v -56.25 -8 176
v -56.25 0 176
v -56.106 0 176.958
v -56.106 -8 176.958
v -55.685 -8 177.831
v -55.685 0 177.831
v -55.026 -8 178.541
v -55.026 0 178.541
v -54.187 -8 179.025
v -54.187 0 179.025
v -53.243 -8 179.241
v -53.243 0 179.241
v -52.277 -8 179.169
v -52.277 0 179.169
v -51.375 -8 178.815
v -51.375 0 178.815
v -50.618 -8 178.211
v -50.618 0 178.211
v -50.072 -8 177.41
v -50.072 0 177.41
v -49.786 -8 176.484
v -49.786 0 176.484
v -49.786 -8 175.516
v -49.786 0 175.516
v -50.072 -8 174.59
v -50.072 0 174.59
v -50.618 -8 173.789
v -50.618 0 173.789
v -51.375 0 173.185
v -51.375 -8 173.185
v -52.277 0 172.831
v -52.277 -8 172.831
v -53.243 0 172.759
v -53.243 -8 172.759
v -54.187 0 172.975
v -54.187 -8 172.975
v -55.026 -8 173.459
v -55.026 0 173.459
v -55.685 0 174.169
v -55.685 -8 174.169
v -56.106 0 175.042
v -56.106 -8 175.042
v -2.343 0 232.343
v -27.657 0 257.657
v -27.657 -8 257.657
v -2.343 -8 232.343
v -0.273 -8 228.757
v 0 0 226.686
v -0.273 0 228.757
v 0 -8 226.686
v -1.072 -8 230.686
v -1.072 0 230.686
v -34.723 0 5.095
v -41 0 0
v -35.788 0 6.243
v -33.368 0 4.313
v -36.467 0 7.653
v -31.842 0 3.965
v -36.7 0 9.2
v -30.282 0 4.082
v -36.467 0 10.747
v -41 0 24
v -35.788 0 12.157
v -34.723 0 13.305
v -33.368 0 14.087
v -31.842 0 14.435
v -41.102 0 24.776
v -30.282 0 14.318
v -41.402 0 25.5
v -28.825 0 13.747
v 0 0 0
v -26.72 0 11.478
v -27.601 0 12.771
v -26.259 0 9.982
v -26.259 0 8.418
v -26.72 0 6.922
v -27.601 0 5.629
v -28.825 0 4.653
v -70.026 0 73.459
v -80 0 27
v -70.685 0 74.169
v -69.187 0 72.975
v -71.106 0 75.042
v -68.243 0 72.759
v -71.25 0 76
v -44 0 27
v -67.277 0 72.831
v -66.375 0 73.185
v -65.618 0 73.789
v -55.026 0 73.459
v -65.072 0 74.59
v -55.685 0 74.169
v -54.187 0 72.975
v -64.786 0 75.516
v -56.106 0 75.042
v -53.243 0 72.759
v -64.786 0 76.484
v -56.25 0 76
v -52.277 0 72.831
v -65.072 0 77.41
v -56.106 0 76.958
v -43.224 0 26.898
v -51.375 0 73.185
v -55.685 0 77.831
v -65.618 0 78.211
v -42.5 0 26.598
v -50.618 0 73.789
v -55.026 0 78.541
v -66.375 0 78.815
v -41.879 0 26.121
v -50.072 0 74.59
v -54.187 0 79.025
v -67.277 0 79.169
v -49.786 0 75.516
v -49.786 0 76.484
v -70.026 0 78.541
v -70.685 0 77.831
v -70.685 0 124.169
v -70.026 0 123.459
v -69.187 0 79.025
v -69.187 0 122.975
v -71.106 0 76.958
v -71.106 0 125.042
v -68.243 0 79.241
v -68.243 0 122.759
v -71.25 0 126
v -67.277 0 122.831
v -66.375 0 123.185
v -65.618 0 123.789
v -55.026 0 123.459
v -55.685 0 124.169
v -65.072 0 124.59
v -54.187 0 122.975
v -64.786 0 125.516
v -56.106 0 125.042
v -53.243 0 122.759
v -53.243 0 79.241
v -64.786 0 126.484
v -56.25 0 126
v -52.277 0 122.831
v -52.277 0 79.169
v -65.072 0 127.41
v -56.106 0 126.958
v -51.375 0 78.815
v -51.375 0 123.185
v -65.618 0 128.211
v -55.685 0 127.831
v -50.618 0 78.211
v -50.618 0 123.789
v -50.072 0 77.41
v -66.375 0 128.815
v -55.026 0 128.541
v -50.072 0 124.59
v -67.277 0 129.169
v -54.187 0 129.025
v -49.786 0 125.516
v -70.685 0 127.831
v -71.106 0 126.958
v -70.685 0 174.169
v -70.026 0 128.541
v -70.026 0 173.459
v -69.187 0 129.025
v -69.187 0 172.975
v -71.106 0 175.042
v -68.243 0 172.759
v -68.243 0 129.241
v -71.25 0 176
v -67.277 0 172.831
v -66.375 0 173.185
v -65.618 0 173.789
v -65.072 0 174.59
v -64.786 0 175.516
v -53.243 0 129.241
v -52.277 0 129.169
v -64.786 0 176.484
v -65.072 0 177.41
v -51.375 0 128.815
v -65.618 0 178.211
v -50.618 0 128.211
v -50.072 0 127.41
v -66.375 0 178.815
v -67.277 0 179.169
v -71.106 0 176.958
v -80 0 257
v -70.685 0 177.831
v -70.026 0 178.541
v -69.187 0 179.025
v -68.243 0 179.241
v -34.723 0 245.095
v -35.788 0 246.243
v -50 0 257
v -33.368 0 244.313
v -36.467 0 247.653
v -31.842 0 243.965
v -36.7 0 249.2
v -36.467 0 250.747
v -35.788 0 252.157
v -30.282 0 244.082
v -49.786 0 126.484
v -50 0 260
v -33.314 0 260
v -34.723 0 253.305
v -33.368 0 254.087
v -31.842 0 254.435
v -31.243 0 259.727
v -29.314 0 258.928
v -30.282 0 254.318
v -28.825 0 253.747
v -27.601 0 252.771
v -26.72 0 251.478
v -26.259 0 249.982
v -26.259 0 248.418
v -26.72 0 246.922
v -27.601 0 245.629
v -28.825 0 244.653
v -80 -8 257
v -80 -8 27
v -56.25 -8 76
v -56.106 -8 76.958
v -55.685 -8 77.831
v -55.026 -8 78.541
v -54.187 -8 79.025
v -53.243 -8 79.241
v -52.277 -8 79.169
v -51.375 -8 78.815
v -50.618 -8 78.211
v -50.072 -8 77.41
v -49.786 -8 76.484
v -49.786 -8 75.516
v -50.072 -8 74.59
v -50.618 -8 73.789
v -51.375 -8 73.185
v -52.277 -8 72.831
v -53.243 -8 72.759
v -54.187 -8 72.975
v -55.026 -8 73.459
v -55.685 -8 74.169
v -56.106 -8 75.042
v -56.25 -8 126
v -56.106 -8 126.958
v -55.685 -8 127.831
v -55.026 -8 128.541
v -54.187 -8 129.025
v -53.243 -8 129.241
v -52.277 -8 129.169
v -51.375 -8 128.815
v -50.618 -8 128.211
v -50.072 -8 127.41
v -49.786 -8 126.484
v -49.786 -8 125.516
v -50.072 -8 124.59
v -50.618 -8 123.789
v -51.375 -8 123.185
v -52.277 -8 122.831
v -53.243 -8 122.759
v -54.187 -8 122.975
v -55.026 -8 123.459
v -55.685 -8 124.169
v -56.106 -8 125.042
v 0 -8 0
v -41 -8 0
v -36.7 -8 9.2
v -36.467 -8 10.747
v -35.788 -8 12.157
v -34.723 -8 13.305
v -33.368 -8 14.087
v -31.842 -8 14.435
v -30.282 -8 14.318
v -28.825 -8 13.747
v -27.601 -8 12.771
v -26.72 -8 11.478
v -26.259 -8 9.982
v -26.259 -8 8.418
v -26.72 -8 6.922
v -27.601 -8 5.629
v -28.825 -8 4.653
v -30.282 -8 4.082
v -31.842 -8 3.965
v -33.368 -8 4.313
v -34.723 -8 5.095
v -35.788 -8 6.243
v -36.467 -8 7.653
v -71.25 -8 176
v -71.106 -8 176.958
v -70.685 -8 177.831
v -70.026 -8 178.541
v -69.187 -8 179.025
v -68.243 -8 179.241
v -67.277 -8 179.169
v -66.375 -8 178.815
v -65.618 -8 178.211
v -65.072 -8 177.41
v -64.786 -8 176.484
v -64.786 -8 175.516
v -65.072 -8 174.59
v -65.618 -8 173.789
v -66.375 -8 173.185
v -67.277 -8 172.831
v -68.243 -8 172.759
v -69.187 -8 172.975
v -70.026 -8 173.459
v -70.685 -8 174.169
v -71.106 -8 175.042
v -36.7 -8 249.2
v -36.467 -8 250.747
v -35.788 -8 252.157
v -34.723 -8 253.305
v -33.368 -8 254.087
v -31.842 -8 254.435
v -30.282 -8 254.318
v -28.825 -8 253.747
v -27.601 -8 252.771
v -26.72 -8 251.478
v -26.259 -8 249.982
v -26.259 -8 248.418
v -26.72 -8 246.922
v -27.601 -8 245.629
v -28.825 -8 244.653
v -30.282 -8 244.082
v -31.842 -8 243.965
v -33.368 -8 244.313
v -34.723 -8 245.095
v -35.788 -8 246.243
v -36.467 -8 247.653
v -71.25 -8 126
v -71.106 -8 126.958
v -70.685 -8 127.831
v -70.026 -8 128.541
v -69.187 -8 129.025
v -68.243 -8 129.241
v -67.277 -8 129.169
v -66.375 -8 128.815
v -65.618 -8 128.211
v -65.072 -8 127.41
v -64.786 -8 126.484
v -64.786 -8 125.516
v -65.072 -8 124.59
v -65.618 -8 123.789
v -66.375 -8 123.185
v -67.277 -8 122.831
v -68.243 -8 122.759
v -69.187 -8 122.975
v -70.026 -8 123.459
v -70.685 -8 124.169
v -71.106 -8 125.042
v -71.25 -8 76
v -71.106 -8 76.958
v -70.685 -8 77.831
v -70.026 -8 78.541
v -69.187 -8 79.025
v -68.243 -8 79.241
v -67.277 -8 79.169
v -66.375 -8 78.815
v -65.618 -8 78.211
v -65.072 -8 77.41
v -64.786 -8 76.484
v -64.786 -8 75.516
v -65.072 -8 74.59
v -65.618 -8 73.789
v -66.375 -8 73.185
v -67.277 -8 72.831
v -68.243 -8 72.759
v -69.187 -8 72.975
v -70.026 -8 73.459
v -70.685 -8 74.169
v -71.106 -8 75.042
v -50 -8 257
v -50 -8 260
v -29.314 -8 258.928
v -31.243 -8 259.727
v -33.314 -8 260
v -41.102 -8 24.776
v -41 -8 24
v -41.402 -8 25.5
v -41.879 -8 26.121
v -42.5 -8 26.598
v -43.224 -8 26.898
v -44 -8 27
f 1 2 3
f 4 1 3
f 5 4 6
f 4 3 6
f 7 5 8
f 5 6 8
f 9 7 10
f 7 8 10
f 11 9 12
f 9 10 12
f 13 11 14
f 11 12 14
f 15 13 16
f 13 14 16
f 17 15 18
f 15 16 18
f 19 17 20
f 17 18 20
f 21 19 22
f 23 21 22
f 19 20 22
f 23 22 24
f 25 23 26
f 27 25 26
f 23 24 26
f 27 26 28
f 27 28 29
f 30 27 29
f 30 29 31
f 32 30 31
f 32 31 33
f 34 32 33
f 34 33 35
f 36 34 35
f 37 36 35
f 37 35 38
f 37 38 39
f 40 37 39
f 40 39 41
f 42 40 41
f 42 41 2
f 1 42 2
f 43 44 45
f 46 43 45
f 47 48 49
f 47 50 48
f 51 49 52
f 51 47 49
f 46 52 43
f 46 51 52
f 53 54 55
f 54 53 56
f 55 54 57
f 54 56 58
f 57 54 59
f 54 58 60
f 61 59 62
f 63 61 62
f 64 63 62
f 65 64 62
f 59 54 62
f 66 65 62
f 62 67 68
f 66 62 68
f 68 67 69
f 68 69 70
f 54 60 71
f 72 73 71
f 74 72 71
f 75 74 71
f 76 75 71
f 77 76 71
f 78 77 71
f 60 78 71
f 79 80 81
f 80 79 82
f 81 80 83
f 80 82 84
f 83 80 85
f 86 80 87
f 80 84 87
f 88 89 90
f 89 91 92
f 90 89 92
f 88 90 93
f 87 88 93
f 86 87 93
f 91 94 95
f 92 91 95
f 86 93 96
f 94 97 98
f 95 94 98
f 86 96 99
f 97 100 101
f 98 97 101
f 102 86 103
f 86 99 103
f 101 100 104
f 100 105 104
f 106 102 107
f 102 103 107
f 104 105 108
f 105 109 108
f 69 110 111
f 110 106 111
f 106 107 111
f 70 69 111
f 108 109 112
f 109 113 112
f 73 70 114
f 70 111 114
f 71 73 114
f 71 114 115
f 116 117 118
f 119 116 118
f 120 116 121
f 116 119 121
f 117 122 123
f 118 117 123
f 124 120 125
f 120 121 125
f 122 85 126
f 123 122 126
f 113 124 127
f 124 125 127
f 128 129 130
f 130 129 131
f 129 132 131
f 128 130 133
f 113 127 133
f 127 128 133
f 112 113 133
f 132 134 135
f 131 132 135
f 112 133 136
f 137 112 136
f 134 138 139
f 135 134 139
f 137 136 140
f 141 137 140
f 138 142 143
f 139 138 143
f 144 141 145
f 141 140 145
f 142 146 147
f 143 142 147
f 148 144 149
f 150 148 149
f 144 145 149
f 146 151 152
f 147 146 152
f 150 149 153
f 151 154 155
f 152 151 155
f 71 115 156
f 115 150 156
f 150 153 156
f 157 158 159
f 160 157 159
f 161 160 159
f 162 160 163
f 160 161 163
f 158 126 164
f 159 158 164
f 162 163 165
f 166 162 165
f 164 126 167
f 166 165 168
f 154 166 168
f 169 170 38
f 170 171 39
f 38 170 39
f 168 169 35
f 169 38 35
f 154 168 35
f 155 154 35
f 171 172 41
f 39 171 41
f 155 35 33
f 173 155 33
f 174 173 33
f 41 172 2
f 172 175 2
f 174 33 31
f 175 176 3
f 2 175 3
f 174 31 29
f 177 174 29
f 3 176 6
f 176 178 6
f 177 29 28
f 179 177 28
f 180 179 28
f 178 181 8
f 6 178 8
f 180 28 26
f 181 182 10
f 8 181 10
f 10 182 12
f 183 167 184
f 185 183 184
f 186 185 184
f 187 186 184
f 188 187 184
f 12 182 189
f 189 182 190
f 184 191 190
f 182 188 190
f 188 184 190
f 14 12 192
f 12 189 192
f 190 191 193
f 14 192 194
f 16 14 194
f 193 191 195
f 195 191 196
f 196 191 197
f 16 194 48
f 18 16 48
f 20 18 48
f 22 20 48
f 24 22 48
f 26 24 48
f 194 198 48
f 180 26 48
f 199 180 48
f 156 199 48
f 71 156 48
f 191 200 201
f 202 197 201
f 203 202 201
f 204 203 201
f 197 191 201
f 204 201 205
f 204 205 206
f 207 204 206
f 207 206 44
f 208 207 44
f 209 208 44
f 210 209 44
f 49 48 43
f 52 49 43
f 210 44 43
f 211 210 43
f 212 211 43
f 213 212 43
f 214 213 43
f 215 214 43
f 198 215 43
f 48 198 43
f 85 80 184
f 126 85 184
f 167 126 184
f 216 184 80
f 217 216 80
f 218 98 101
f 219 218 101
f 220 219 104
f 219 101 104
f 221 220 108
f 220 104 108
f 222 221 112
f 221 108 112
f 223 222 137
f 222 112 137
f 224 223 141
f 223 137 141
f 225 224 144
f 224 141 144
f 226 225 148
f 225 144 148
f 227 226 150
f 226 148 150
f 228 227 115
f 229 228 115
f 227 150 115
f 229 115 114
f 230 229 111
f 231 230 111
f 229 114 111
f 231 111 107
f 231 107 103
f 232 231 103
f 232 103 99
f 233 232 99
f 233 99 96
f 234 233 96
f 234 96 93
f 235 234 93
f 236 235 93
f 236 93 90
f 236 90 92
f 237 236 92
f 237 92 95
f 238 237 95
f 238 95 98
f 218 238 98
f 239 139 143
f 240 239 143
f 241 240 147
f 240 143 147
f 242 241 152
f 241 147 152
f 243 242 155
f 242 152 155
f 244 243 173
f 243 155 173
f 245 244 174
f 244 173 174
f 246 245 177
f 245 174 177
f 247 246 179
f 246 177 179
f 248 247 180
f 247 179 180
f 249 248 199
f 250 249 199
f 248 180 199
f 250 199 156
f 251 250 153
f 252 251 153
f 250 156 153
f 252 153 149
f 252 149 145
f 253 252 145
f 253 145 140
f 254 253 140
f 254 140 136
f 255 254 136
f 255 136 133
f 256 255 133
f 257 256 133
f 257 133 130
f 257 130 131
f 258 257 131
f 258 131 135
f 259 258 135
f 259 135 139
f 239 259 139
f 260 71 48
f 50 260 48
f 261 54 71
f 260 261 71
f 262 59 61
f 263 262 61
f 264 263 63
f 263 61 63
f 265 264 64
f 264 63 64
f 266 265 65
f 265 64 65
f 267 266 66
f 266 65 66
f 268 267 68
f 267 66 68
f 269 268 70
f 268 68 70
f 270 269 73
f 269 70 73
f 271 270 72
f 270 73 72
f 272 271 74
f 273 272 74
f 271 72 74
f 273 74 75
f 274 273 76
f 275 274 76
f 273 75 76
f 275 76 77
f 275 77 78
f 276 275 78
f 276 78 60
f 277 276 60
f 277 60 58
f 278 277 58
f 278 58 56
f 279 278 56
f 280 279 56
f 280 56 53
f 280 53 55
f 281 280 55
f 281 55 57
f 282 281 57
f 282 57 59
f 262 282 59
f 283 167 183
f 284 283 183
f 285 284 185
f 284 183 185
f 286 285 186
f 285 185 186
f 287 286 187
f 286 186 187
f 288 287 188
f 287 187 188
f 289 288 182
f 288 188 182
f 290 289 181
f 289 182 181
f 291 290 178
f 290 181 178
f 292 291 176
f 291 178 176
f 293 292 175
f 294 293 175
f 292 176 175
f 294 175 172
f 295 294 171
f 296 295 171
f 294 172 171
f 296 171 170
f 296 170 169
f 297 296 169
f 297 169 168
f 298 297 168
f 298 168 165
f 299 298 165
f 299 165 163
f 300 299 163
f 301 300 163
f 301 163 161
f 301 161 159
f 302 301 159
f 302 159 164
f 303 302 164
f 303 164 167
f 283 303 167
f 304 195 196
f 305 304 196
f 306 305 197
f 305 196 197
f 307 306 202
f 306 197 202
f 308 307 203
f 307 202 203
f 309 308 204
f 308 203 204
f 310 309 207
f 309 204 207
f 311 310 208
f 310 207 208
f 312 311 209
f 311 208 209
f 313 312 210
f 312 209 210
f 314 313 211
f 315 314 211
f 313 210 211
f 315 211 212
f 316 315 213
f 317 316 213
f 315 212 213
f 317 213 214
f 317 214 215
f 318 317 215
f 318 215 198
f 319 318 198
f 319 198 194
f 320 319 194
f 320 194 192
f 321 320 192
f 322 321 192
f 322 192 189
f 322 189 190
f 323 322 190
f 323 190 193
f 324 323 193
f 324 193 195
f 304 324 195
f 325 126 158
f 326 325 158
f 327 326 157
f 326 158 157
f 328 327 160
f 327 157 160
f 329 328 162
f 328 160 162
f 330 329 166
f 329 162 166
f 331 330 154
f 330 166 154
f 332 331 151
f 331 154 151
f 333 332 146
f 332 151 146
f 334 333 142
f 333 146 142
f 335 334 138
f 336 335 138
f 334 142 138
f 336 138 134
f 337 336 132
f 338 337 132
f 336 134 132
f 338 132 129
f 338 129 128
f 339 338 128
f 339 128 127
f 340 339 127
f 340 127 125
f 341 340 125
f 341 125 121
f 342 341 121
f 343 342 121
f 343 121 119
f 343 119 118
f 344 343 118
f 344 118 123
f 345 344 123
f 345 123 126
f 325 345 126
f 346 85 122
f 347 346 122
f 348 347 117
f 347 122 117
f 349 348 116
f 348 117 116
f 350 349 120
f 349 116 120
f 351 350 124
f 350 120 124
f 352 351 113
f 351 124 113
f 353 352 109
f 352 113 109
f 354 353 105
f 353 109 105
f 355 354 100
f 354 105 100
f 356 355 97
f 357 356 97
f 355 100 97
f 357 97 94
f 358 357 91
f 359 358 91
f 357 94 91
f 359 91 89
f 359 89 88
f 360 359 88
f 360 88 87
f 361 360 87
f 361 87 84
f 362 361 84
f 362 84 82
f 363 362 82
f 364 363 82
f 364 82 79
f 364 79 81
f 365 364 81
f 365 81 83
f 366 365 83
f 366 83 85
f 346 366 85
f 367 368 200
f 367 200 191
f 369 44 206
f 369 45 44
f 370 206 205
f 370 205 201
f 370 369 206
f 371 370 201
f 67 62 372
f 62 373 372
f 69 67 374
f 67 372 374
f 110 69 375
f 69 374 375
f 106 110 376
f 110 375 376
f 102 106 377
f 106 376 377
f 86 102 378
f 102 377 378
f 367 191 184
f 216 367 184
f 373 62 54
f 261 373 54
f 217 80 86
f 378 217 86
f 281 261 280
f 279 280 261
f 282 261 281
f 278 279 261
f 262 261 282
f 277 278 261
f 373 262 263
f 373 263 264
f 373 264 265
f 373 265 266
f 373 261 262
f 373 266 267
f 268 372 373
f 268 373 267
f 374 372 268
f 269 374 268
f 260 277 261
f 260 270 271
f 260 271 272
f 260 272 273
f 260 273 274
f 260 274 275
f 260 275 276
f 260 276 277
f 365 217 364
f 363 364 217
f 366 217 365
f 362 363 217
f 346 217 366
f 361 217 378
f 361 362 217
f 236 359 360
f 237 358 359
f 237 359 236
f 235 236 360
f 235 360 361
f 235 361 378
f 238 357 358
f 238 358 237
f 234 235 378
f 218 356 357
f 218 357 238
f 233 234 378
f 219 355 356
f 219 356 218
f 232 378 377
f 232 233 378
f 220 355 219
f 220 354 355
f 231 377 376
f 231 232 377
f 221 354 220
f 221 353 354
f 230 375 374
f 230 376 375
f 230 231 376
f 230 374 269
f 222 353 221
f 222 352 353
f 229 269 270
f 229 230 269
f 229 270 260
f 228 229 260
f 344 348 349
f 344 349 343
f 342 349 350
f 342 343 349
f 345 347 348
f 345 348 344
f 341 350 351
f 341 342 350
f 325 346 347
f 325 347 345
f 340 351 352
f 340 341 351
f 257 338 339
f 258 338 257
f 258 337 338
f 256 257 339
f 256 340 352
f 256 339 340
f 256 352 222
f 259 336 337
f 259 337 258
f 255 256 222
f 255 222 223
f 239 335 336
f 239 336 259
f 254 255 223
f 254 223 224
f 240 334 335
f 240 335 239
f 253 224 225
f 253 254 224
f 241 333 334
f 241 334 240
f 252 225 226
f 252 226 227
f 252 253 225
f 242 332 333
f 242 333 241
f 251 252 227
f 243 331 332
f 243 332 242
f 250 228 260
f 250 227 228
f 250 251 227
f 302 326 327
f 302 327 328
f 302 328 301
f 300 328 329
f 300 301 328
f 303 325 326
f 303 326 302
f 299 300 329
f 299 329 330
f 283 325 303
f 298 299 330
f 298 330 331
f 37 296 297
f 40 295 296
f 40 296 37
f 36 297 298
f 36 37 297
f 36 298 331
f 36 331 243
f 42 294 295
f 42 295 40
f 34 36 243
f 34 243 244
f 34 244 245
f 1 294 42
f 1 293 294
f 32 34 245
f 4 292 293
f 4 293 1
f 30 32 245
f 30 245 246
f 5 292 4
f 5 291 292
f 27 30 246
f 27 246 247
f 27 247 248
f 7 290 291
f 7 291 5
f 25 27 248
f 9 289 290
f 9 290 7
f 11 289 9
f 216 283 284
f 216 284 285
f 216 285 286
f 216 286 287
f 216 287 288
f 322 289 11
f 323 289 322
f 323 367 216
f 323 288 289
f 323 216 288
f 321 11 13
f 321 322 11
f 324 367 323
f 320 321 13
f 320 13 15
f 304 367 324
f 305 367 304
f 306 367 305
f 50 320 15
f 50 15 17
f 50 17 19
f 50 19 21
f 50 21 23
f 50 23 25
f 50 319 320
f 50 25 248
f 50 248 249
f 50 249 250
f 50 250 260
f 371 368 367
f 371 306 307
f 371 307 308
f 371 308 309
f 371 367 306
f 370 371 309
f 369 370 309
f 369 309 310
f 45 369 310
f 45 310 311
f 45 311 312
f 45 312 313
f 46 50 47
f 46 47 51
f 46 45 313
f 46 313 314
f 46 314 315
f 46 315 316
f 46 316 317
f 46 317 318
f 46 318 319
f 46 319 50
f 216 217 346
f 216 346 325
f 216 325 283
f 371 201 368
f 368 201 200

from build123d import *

# Parameters (mm, degrees)
F1_DEPTH = 8
F2_SIZE  = 30
F4_D     = 6.5
F6_D     = 10.5
F7_R     = 8
F8_R     = 3


with BuildPart() as f1:
    # F0 (on Front) → F1 (new body)
    with BuildSketch(Plane.XZ):
        Polygon((-41, 0), (0, 0), (0, 260), (-50, 260), (-50, 257), (-80, 257), (-80, 27), (-41, 27), align=None)
    extrude(amount=F1_DEPTH)

    # F2
    f2_edges = [f1.edges().sort_by_distance(p)[0] for p in [
        (0, -4, 260),
    ]]
    chamfer(f2_edges, length=F2_SIZE)

    # F4 (through all)
    with Locations(Plane.XZ.offset(8)):
        with Locations((-53, 176), (-68, 176), (-53, 126), (-68, 126), (-53, 76), (-68, 76)):
            Hole(F4_D / 2)

    # F6 (through all)
    with Locations(Plane.XZ.offset(8)):
        with Locations((-31.45, 249.2), (-31.45, 9.2)):
            Hole(F6_D / 2)

    # F7
    f7_edges = [f1.edges().sort_by_distance(p)[0] for p in [
        (-30, -4, 260),
        (0, -4, 230),
    ]]
    fillet(f7_edges, radius=F7_R)

    # F8
    f8_edges = [f1.edges().sort_by_distance(p)[0] for p in [
        (-41, -4, 27),
    ]]
    fillet(f8_edges, radius=F8_R)


solid = f1.part
